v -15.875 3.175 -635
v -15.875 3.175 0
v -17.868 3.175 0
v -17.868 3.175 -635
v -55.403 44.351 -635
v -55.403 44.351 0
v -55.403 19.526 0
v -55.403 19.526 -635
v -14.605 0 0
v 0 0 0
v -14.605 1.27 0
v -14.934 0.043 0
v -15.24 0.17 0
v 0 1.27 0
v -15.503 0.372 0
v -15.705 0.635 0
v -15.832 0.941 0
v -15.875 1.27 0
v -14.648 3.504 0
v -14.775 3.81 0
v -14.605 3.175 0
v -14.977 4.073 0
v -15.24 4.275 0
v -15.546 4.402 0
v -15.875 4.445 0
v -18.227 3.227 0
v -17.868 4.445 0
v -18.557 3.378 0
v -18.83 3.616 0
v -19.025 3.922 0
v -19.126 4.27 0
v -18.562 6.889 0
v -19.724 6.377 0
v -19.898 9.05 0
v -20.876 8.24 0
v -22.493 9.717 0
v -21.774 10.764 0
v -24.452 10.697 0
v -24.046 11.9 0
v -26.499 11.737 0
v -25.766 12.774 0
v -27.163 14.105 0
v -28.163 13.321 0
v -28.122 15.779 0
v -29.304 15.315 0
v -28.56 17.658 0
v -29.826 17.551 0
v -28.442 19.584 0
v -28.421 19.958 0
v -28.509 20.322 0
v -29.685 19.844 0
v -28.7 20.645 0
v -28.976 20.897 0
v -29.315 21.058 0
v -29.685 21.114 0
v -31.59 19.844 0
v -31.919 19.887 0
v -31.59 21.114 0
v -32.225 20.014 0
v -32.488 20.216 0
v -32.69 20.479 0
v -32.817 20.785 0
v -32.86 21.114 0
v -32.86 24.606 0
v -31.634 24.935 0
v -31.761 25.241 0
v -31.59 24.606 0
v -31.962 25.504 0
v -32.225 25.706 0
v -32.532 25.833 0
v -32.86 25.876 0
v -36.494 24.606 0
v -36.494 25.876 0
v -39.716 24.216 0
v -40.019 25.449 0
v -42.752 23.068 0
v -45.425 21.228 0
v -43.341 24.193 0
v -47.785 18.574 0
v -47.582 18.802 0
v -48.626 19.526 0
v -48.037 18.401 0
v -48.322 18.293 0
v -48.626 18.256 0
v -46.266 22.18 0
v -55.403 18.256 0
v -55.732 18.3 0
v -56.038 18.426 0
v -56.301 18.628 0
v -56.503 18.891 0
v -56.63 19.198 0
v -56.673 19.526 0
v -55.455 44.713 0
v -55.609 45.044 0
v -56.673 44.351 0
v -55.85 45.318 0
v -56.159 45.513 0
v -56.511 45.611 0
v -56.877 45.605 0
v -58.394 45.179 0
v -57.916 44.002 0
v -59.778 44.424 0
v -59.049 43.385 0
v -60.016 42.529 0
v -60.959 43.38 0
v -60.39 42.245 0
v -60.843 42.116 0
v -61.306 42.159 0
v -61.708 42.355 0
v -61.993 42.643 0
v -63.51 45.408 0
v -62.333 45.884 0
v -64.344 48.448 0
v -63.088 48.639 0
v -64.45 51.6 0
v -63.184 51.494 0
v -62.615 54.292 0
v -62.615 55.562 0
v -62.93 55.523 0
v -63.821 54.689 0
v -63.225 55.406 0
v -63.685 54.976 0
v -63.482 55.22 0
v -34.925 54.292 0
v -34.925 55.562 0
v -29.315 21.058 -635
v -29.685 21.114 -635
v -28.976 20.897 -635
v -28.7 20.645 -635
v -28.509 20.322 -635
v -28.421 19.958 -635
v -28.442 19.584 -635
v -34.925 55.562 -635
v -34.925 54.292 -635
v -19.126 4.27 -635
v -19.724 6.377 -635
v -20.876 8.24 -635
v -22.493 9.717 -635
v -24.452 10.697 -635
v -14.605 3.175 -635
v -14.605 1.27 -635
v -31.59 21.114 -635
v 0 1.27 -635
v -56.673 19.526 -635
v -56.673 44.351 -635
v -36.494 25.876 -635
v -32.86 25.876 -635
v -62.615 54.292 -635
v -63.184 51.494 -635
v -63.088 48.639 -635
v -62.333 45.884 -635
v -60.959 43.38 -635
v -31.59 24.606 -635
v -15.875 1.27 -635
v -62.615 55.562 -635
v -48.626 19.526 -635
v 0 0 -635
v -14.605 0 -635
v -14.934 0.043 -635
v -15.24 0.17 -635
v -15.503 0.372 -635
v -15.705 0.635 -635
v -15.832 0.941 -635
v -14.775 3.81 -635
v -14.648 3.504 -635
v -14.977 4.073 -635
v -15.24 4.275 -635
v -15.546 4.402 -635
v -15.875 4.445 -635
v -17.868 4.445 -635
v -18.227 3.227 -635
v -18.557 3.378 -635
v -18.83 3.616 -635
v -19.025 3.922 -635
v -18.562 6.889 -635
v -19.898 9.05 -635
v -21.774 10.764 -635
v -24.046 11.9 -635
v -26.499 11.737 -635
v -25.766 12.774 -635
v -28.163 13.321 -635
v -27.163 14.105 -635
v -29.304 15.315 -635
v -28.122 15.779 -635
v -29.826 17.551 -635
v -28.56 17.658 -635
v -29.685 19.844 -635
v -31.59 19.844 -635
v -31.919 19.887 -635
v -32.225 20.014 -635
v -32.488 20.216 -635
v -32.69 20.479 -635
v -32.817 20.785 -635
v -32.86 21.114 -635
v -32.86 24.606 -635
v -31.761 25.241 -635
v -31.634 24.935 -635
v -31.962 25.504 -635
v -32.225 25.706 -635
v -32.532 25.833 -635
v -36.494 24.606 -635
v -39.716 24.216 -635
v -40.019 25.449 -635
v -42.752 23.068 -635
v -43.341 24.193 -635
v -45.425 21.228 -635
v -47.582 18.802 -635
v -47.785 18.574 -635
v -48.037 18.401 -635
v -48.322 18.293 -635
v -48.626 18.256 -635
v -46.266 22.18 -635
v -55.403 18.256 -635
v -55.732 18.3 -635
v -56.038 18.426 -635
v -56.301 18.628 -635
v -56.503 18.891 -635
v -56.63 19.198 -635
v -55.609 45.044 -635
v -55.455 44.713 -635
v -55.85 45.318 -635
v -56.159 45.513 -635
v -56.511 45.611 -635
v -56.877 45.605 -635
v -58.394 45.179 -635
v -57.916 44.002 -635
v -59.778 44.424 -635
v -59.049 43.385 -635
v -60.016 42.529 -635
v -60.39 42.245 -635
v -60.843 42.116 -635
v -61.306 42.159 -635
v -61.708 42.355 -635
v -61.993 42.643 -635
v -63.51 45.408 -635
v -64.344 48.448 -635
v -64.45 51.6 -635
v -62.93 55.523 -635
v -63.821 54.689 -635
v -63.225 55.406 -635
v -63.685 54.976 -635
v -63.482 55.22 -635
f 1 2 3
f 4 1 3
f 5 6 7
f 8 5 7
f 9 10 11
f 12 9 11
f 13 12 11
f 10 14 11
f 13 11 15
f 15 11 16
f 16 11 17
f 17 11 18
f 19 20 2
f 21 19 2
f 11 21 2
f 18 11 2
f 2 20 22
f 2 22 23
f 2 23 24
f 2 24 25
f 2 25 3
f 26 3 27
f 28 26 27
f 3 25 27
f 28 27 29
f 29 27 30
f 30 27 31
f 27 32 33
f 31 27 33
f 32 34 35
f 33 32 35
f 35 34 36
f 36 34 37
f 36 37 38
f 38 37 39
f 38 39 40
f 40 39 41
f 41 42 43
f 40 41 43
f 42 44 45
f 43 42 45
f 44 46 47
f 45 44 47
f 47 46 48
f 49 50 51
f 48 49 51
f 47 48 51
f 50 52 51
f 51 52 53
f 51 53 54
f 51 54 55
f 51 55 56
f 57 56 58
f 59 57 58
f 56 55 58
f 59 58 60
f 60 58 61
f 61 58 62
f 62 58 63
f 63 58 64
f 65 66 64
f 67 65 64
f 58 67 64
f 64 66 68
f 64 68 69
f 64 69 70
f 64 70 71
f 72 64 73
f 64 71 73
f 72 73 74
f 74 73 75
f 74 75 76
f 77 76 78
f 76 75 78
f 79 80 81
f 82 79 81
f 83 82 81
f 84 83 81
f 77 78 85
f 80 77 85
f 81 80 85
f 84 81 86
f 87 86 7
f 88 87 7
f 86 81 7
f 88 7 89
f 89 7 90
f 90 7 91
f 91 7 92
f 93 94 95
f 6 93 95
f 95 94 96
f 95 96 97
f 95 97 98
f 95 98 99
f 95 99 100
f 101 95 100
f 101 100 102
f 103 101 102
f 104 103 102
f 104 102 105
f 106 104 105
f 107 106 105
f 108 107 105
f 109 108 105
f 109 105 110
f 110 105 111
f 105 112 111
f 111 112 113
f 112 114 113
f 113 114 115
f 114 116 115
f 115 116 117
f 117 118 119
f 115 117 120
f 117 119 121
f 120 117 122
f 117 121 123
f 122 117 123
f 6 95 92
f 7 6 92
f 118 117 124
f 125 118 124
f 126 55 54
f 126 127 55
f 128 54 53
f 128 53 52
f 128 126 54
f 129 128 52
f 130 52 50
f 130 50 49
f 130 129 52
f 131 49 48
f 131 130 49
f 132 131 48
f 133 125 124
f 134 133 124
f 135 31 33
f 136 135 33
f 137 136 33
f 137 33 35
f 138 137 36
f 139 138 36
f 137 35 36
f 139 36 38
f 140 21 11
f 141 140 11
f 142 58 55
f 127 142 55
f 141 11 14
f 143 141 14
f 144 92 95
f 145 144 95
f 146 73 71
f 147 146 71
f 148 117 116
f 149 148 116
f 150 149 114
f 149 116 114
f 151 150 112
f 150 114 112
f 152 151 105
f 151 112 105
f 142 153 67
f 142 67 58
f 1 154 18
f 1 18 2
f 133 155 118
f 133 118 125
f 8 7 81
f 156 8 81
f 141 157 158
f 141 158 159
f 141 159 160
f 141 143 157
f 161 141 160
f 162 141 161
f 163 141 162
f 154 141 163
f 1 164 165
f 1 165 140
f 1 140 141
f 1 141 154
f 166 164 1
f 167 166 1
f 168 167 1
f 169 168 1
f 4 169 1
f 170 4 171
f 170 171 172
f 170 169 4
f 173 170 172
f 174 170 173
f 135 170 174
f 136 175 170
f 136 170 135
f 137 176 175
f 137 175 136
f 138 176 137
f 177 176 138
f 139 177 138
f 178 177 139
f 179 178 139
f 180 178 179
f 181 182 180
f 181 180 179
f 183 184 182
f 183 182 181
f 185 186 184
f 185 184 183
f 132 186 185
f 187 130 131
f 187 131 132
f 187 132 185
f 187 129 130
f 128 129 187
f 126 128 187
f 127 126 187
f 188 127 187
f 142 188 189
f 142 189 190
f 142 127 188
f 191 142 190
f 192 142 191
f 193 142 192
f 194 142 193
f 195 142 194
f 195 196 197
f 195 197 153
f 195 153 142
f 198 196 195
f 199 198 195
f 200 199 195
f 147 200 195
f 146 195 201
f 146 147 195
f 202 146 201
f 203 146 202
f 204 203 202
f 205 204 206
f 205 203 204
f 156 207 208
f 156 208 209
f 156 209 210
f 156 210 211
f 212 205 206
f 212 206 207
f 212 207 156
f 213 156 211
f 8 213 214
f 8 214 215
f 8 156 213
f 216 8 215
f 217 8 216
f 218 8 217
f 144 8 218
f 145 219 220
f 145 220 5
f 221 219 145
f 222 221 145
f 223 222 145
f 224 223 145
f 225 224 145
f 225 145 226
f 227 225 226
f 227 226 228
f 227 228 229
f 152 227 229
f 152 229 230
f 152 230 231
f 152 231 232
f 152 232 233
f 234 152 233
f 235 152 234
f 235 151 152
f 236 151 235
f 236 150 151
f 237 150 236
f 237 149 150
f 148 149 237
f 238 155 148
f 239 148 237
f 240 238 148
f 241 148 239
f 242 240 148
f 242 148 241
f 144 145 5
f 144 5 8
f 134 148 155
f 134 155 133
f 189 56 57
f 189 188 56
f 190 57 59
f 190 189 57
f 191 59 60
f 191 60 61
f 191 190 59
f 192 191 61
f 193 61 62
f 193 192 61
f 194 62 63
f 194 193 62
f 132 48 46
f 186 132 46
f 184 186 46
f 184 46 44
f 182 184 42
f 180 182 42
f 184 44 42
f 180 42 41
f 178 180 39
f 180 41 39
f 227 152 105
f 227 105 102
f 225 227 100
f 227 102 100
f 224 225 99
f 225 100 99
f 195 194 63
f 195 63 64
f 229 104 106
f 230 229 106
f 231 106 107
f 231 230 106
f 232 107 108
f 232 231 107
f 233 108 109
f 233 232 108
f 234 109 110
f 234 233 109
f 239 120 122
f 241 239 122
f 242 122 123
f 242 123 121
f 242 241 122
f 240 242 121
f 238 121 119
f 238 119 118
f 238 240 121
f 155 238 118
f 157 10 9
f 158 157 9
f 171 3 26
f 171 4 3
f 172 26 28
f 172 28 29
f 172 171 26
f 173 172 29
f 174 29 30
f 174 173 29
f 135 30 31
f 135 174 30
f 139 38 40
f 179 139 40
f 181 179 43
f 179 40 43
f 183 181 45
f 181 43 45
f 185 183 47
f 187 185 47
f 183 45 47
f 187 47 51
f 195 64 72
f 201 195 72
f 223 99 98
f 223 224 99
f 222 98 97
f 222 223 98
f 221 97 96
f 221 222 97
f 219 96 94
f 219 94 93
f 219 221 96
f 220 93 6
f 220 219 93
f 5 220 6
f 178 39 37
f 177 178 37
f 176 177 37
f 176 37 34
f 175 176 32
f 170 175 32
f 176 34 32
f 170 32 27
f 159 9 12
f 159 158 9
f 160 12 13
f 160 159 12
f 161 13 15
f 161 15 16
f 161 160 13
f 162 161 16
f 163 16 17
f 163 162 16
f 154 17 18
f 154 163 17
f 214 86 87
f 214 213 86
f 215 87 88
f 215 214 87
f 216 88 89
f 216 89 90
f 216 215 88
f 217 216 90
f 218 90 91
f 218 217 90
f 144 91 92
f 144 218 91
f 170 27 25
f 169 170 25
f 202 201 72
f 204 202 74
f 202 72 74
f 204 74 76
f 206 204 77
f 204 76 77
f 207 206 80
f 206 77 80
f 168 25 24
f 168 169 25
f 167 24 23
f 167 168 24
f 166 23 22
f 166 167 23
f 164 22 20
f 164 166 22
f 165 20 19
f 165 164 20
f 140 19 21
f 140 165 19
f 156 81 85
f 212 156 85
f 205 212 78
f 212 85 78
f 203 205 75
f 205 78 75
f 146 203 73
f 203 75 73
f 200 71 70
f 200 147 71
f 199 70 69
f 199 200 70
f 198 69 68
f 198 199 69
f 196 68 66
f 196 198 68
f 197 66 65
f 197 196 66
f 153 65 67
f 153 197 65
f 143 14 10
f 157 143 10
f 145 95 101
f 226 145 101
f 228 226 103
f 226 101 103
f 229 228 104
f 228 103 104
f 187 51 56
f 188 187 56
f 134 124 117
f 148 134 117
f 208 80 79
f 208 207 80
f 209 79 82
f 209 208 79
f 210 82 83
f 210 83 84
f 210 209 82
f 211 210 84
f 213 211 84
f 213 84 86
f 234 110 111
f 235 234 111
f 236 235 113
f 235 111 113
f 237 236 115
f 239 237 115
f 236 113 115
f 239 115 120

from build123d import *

# Parameters (mm, degrees)
EXTRUDE_THIN1_DEPTH = 635
FILLET1_R           = 1.27


with BuildPart() as part:
    # Sketch1 → Extrude-Thin1 (new body)
    with BuildSketch(Plane.XY):
        with BuildLine():
            Line((0, 0), (-15.875, 0))
            Line((-15.875, 0), (-15.875, 3.175))
            Line((-15.875, 3.175), (-19.05, 3.175))
            ThreePointArc((-19.05, 3.175), (-20.540376263, 7.805172974), (-24.451827217, 10.69658692))
            ThreePointArc((-24.451827217, 10.69658692), (-28.805679852, 14.276302994), (-29.685414913, 19.84375))
            Line((-29.685414913, 19.84375), (-32.860414913, 19.84375))
            Line((-32.860414913, 19.84375), (-32.860414913, 24.60625))
            Line((-32.860414913, 24.60625), (-36.494039614, 24.60625))
            ThreePointArc((-36.494039614, 24.60625), (-43.039469794, 22.912442068), (-47.941664913, 18.25625))
            Line((-47.941664913, 18.25625), (-56.672914913, 18.25625))
            Line((-56.672914913, 18.25625), (-56.672914913, 44.351036989))
            ThreePointArc((-56.672914913, 44.351036989), (-59.143520033, 43.316980719), (-60.876574207, 41.275))
            ThreePointArc((-60.876574207, 41.275), (-64.274926573, 48.035607826), (-63.5, 55.5625))
            Line((-63.5, 55.5625), (-34.925, 55.5625))
            Line((-34.925, 55.5625), (-34.925, 54.2925))
            Line((-34.925, 54.2925), (-62.614600616, 54.2925))
            ThreePointArc((-62.614600616, 54.2925), (-63.088488589, 48.638883567), (-60.958941974, 43.380273504))
            ThreePointArc((-60.958941974, 43.380273504), (-58.440775835, 45.159436942), (-55.402914913, 45.686679074))
            Line((-55.402914913, 45.686679074), (-55.402914913, 19.52625))
            Line((-55.402914913, 19.52625), (-48.62569758, 19.52625))
            ThreePointArc((-48.62569758, 19.52625), (-43.340564736, 24.19276788), (-36.494039614, 25.87625))
            Line((-36.494039614, 25.87625), (-31.590414913, 25.87625))
            Line((-31.590414913, 25.87625), (-31.590414913, 21.11375))
            Line((-31.590414913, 21.11375), (-27.922084416, 21.11375))
            ThreePointArc((-27.922084416, 21.11375), (-28.061990954, 15.63278224), (-24.046119572, 11.900040827))
            ThreePointArc((-24.046119572, 11.900040827), (-19.898030583, 9.05015784), (-17.868006799, 4.445))
            Line((-17.868006799, 4.445), (-14.605, 4.445))
            Line((-14.605, 4.445), (-14.605, 1.27))
            Line((-14.605, 1.27), (0, 1.27))
            Line((0, 1.27), (0, 0))
        make_face()
    extrude(amount=-EXTRUDE_THIN1_DEPTH)

    # Fillet1
    fillet1_edges = [part.edges().sort_by_distance(p)[0] for p in [
        (-55.402914913, 45.686679074, -317.5),
        (-31.590414913, 25.87625, -317.5),
        (-27.922084416, 21.11375, -317.5),
        (-14.605, 4.445, -317.5),
        (-15.875, 0, -317.5),
        (-19.05, 3.175, -317.5),
        (-32.860414913, 19.84375, -317.5),
        (-47.941664913, 18.25625, -317.5),
        (-56.672914913, 18.25625, -317.5),
        (-60.876574207, 41.275, -317.5),
        (-63.5, 55.5625, -317.5),
    ]]
    fillet(fillet1_edges, radius=FILLET1_R)


solid = part.part
